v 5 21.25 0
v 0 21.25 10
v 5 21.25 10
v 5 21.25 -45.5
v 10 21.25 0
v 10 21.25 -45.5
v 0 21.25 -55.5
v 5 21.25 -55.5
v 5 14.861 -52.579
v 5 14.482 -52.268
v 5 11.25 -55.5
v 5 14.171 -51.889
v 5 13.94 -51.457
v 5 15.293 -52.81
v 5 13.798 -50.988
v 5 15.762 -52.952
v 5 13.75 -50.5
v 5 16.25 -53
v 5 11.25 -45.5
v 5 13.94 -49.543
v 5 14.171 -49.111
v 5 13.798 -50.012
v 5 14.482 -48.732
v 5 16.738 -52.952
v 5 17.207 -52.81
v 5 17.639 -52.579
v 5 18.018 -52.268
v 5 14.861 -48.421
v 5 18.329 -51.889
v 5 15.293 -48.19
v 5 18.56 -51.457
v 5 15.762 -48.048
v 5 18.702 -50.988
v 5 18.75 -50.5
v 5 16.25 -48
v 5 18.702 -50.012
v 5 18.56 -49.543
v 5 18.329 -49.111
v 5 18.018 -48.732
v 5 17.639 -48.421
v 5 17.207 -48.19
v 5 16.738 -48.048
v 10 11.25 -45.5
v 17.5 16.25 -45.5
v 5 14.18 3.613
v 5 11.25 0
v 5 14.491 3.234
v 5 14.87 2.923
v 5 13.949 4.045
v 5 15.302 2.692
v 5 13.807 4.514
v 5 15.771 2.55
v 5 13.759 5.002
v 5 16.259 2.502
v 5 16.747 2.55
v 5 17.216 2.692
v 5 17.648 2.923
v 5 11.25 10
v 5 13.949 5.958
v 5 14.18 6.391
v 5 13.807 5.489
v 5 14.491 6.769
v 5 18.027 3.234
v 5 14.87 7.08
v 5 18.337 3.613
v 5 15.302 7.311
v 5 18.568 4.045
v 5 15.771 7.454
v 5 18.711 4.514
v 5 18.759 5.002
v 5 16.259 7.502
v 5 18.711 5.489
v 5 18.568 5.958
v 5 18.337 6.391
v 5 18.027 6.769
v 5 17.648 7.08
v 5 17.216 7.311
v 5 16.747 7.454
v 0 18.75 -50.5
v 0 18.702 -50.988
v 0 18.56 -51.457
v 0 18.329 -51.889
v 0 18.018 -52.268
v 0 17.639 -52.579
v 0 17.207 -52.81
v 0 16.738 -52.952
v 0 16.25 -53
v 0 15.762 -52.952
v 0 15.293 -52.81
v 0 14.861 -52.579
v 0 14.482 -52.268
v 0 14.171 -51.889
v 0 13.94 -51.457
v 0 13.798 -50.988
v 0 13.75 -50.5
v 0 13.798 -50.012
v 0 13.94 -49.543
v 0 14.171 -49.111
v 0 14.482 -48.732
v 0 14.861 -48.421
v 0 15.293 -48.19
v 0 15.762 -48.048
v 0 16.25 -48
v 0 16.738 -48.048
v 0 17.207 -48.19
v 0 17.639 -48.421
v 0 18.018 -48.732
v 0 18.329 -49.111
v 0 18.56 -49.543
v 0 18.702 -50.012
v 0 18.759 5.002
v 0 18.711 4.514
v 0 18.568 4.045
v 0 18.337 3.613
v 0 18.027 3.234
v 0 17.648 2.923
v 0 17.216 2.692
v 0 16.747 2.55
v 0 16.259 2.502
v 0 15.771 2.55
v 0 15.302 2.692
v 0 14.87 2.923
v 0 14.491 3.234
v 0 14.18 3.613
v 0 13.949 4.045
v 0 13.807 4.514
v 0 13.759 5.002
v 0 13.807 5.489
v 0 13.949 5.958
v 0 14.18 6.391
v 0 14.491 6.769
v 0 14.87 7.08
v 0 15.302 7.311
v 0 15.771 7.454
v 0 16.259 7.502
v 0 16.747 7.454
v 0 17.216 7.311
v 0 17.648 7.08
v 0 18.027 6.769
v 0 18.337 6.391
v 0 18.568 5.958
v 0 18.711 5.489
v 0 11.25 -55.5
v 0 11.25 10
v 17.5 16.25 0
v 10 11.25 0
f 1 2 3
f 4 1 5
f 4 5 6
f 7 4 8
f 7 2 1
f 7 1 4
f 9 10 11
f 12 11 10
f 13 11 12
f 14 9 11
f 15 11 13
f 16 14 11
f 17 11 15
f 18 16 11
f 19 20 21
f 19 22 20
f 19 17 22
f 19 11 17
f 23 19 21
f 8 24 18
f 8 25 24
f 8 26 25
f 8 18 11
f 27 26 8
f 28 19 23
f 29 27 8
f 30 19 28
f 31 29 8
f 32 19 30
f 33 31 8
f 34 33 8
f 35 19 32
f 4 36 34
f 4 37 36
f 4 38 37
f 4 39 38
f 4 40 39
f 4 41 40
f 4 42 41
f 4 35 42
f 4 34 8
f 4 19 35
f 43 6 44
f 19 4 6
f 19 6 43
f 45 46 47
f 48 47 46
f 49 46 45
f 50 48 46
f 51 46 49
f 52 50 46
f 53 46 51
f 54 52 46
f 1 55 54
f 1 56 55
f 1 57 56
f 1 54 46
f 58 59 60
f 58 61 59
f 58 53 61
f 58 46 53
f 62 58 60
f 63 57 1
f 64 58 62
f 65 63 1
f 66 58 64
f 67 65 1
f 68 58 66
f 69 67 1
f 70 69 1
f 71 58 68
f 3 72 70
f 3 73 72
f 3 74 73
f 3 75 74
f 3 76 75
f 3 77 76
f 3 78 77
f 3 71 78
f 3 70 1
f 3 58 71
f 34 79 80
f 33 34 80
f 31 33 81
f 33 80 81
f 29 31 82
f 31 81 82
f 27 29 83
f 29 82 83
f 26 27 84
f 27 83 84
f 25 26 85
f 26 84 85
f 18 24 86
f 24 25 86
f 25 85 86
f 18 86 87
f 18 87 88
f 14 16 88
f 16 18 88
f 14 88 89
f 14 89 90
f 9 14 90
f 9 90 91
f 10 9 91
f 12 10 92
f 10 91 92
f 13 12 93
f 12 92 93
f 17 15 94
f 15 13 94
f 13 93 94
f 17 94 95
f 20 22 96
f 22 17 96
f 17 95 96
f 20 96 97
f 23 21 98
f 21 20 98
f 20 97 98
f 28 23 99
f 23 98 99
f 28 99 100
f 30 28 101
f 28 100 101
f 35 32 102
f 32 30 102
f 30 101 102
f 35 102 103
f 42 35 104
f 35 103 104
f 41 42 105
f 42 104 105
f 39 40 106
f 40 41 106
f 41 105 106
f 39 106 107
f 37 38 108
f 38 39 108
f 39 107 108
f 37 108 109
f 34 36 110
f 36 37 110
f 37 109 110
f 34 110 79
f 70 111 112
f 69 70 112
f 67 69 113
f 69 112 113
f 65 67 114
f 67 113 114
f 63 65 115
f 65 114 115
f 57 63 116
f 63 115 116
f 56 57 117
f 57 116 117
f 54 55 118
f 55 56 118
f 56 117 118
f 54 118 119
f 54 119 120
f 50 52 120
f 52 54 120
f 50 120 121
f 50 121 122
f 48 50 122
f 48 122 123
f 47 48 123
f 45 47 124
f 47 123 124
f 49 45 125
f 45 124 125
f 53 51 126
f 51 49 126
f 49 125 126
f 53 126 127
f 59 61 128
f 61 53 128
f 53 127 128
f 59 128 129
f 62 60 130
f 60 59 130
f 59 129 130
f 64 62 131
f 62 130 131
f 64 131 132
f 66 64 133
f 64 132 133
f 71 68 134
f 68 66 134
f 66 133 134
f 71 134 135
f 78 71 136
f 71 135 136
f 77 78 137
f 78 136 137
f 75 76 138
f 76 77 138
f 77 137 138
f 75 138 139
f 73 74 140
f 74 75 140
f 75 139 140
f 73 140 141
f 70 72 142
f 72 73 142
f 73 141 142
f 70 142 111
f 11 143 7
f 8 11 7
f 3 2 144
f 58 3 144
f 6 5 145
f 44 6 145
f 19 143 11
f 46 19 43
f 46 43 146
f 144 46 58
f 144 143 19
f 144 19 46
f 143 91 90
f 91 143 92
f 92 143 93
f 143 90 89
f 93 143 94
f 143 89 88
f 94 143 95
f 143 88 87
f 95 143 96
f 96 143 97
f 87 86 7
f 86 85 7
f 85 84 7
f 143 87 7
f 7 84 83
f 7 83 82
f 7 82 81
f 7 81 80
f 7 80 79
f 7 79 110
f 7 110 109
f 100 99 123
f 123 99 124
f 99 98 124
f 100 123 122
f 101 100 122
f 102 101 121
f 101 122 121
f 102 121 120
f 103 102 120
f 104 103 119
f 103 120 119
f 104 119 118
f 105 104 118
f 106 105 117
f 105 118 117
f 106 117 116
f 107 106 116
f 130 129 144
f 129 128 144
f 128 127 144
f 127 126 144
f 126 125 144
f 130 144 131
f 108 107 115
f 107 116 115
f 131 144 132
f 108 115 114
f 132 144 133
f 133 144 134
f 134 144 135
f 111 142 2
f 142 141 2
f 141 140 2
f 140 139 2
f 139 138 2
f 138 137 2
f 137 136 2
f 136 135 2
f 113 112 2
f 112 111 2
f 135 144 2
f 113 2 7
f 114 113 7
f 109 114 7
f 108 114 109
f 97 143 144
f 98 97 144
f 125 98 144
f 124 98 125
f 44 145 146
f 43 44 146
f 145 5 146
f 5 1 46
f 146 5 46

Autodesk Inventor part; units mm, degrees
ref_plane "YZ Plane" through (0, 0, 0) normal (1, 0, 0) x (0, 1, 0)
ref_plane "XZ Plane" through (0, 0, 0) normal (0, 1, 0) x (-1, 0, 0)
ref_plane "XY Plane" through (0, 0, 0) normal (0, 0, 1) x (1, 0, 0)
sketch "Sketch1" plane through (0, 0, 0) normal (1, 0, 0) x (0, 1, 0)
  line L0 (-6, -12.5) -> (-6, -12.9)
  arc A0 (-6, -12.9) -> (-5.6, -13.3) centre (-5.6, -12.9) ccw
  line L1 (-5.6, -13.3) -> (-4.9, -13.3)
  arc A1 (-4.9, -13.3) -> (-4.7, -13.1) centre (-4.9, -13.1) ccw
  line L2 (-4.7, -13.1) -> (-4.7, -12.85)
  arc A2 (-4.5, -12.65) -> (-4.7, -12.85) centre (-4.5, -12.85) ccw
  line L3 (-4.5, -12.65) -> (-1.8, -12.65)
  arc A3 (-1.4, -13.05) -> (-1.8, -12.65) centre (-1.8, -13.05) ccw
  line L4 (-1.4, -13.05) -> (-1.4, -18.75)
  line L5 (-1.8, -19.15) -> (-4.5, -19.15)
  arc A4 (-1.8, -19.15) -> (-1.4, -18.75) centre (-1.8, -18.75) ccw
  arc A5 (-4.7, -18.95) -> (-4.5, -19.15) centre (-4.5, -18.95) ccw
  line L6 (-4.7, -18.95) -> (-4.7, -18.7)
  arc A6 (-4.7, -18.7) -> (-4.9, -18.5) centre (-4.9, -18.7) ccw
  line L7 (-4.9, -18.5) -> (-5.6, -18.5)
  arc A7 (-5.6, -18.5) -> (-6, -18.9) centre (-5.6, -18.9) ccw
  line L8 (-6, -18.9) -> (-6, -19.5)
  line L9 (-6.5, -6.5) -> (-6.5, -12.5)
  line L10 (-6.5, -12.5) -> (-2.5, -12.5)
  line L11 (-1.05, -19.5) -> (-6.5, -19.5)
  line L12 (-6.5, -19.5) -> (-6.5, -26)
  line L13 (-6.5, -26) -> (-1.05, -26)
  line L14 (-6, -26) -> (-6, -26.6)
  arc A8 (-6, -26.6) -> (-5.6, -27) centre (-5.6, -26.6) ccw
  line L15 (-5.6, -27) -> (-4.9, -27)
  arc A9 (-4.9, -27) -> (-4.7, -26.8) centre (-4.9, -26.8) ccw
  arc A10 (-4.5, -26.35) -> (-4.7, -26.55) centre (-4.5, -26.55) ccw
  line L16 (-4.7, -26.8) -> (-4.7, -26.55)
  line L17 (-4.5, -26.35) -> (-1.8, -26.35)
  arc A11 (-1.4, -26.75) -> (-1.8, -26.35) centre (-1.8, -26.75) ccw
  line L18 (-1.4, -26.75) -> (-1.4, -32.45)
  arc A12 (-1.8, -32.85) -> (-1.4, -32.45) centre (-1.8, -32.45) ccw
  line L19 (-1.8, -32.85) -> (-4.5, -32.85)
  arc A13 (-4.7, -32.65) -> (-4.5, -32.85) centre (-4.5, -32.65) ccw
  line L20 (-4.7, -32.65) -> (-4.7, -32.4)
  arc A14 (-4.7, -32.4) -> (-4.9, -32.2) centre (-4.9, -32.4) ccw
  line L21 (-4.9, -32.2) -> (-5.6, -32.2)
  arc A15 (-5.6, -32.2) -> (-6, -32.6) centre (-5.6, -32.6) ccw
  line L22 (-6, -32.6) -> (-6, -33)
  line L23 (-2.5, -33) -> (-6.5, -33)
  line L24 (-6.5, -33) -> (-6.5, -39)
  line L25 (32.5, 0) -> (0, 0)
  circle A16 centre (0, -6.5) radius 4.75
  circle A17 centre (32.5, -6.5) radius 4.75
  circle A18 centre (0, -39) radius 4.75
  circle A19 centre (32.5, -39) radius 4.75
  line L26 (39, -26) -> (39, -19.5)
  line L27 (39, -12.5) -> (39, -6.5)
  line L28 (39, -39) -> (39, -33)
  line L29 (26.5, -45.5) -> (32.5, -45.5)
  line L30 (0, -45.5) -> (6, -45.5)
  line L31 (13, -45.5) -> (19.5, -45.5)
  circle A20 centre (16.25, -22.75) radius 15
  circle A21 centre (16.2588, 5.0016) radius 2.5
  circle A22 centre (16.25, -50.5) radius 2.5
  circle A23 centre (16.25, -22.75) radius 5
  circle A24 centre (16.25, -22.75) radius 8.45
  line L32 (24.75, -27.6575) -> (24.75, -17.8425)
  line L33 (44, 10) -> (-11.5, 10)
  line L34 (-11.5, 10) -> (-11.5, -55.5)
  line L35 (-11.5, -55.5) -> (44, -55.5)
  line L36 (44, -55.5) -> (44, 10)
  line L37 (-11.5, 30) -> (44, 30)
  line L38 (-11.5, -75.5) -> (-11.5, 30)
  line L39 (44, 30) -> (44, -75.5)
  line L40 (44, -75.5) -> (-11.5, -75.5)
  circle A25 centre (16.25, -65.5) radius 5
  circle A26 centre (16.25, 20) radius 5
  arc A27 (11.25, -55.5) -> (21.25, -55.5) centre (16.25, -55.5) ccw
  line L41 (21.25, 10) -> (21.25, -55.5)
  line L42 (11.25, -55.5) -> (11.25, 10)
  arc A28 (21.25, 10) -> (11.25, 10) centre (16.25, 10) ccw
  line L43 (21.25, -45.5) -> (11.25, -45.5)
  point P0 (21.25, 0)
  point P1 (11.25, 0)
extrude "Extrusion1" add sketch "Sketch1" along normal blind 10 contours L41 A20 L42 L25 | L41 A24 L42 A20 | L41 A23 L42 A24 | L42 A24 L41 A20 | A20 L41 L43 L31 L42 | A23 | L41 A24 L42 A23
extrude "Extrusion2" add sketch "Sketch1" along normal blind 5 contours L25 L42 L33 L41 | L43 L31 L41 L35 L42
sketch "Sketch2" plane through (10, 11.25, 0) normal (0, 0, 1) x (1, 0, 0)
  line L0 (0, 10) -> (0, 0) projected
  circle A0 centre (0, 5) radius 7.5
  line L1 (0, 5) -> (11.155, 5)
  line L2 (-5, 10) -> (0, 10) projected
  line L3 (0, 10) -> (7.5, 5)
  line L4 (7.5, 5) -> (0, 0)
  point P0 (-10, -11.25)
  dimension "d4" = 15
extrude "Extrusion3" add sketch "Sketch2" against normal up to surface (45.5 mm away) contours L3 L1 L0 | L1 L4 L0
properties part number "Cuchilla"
